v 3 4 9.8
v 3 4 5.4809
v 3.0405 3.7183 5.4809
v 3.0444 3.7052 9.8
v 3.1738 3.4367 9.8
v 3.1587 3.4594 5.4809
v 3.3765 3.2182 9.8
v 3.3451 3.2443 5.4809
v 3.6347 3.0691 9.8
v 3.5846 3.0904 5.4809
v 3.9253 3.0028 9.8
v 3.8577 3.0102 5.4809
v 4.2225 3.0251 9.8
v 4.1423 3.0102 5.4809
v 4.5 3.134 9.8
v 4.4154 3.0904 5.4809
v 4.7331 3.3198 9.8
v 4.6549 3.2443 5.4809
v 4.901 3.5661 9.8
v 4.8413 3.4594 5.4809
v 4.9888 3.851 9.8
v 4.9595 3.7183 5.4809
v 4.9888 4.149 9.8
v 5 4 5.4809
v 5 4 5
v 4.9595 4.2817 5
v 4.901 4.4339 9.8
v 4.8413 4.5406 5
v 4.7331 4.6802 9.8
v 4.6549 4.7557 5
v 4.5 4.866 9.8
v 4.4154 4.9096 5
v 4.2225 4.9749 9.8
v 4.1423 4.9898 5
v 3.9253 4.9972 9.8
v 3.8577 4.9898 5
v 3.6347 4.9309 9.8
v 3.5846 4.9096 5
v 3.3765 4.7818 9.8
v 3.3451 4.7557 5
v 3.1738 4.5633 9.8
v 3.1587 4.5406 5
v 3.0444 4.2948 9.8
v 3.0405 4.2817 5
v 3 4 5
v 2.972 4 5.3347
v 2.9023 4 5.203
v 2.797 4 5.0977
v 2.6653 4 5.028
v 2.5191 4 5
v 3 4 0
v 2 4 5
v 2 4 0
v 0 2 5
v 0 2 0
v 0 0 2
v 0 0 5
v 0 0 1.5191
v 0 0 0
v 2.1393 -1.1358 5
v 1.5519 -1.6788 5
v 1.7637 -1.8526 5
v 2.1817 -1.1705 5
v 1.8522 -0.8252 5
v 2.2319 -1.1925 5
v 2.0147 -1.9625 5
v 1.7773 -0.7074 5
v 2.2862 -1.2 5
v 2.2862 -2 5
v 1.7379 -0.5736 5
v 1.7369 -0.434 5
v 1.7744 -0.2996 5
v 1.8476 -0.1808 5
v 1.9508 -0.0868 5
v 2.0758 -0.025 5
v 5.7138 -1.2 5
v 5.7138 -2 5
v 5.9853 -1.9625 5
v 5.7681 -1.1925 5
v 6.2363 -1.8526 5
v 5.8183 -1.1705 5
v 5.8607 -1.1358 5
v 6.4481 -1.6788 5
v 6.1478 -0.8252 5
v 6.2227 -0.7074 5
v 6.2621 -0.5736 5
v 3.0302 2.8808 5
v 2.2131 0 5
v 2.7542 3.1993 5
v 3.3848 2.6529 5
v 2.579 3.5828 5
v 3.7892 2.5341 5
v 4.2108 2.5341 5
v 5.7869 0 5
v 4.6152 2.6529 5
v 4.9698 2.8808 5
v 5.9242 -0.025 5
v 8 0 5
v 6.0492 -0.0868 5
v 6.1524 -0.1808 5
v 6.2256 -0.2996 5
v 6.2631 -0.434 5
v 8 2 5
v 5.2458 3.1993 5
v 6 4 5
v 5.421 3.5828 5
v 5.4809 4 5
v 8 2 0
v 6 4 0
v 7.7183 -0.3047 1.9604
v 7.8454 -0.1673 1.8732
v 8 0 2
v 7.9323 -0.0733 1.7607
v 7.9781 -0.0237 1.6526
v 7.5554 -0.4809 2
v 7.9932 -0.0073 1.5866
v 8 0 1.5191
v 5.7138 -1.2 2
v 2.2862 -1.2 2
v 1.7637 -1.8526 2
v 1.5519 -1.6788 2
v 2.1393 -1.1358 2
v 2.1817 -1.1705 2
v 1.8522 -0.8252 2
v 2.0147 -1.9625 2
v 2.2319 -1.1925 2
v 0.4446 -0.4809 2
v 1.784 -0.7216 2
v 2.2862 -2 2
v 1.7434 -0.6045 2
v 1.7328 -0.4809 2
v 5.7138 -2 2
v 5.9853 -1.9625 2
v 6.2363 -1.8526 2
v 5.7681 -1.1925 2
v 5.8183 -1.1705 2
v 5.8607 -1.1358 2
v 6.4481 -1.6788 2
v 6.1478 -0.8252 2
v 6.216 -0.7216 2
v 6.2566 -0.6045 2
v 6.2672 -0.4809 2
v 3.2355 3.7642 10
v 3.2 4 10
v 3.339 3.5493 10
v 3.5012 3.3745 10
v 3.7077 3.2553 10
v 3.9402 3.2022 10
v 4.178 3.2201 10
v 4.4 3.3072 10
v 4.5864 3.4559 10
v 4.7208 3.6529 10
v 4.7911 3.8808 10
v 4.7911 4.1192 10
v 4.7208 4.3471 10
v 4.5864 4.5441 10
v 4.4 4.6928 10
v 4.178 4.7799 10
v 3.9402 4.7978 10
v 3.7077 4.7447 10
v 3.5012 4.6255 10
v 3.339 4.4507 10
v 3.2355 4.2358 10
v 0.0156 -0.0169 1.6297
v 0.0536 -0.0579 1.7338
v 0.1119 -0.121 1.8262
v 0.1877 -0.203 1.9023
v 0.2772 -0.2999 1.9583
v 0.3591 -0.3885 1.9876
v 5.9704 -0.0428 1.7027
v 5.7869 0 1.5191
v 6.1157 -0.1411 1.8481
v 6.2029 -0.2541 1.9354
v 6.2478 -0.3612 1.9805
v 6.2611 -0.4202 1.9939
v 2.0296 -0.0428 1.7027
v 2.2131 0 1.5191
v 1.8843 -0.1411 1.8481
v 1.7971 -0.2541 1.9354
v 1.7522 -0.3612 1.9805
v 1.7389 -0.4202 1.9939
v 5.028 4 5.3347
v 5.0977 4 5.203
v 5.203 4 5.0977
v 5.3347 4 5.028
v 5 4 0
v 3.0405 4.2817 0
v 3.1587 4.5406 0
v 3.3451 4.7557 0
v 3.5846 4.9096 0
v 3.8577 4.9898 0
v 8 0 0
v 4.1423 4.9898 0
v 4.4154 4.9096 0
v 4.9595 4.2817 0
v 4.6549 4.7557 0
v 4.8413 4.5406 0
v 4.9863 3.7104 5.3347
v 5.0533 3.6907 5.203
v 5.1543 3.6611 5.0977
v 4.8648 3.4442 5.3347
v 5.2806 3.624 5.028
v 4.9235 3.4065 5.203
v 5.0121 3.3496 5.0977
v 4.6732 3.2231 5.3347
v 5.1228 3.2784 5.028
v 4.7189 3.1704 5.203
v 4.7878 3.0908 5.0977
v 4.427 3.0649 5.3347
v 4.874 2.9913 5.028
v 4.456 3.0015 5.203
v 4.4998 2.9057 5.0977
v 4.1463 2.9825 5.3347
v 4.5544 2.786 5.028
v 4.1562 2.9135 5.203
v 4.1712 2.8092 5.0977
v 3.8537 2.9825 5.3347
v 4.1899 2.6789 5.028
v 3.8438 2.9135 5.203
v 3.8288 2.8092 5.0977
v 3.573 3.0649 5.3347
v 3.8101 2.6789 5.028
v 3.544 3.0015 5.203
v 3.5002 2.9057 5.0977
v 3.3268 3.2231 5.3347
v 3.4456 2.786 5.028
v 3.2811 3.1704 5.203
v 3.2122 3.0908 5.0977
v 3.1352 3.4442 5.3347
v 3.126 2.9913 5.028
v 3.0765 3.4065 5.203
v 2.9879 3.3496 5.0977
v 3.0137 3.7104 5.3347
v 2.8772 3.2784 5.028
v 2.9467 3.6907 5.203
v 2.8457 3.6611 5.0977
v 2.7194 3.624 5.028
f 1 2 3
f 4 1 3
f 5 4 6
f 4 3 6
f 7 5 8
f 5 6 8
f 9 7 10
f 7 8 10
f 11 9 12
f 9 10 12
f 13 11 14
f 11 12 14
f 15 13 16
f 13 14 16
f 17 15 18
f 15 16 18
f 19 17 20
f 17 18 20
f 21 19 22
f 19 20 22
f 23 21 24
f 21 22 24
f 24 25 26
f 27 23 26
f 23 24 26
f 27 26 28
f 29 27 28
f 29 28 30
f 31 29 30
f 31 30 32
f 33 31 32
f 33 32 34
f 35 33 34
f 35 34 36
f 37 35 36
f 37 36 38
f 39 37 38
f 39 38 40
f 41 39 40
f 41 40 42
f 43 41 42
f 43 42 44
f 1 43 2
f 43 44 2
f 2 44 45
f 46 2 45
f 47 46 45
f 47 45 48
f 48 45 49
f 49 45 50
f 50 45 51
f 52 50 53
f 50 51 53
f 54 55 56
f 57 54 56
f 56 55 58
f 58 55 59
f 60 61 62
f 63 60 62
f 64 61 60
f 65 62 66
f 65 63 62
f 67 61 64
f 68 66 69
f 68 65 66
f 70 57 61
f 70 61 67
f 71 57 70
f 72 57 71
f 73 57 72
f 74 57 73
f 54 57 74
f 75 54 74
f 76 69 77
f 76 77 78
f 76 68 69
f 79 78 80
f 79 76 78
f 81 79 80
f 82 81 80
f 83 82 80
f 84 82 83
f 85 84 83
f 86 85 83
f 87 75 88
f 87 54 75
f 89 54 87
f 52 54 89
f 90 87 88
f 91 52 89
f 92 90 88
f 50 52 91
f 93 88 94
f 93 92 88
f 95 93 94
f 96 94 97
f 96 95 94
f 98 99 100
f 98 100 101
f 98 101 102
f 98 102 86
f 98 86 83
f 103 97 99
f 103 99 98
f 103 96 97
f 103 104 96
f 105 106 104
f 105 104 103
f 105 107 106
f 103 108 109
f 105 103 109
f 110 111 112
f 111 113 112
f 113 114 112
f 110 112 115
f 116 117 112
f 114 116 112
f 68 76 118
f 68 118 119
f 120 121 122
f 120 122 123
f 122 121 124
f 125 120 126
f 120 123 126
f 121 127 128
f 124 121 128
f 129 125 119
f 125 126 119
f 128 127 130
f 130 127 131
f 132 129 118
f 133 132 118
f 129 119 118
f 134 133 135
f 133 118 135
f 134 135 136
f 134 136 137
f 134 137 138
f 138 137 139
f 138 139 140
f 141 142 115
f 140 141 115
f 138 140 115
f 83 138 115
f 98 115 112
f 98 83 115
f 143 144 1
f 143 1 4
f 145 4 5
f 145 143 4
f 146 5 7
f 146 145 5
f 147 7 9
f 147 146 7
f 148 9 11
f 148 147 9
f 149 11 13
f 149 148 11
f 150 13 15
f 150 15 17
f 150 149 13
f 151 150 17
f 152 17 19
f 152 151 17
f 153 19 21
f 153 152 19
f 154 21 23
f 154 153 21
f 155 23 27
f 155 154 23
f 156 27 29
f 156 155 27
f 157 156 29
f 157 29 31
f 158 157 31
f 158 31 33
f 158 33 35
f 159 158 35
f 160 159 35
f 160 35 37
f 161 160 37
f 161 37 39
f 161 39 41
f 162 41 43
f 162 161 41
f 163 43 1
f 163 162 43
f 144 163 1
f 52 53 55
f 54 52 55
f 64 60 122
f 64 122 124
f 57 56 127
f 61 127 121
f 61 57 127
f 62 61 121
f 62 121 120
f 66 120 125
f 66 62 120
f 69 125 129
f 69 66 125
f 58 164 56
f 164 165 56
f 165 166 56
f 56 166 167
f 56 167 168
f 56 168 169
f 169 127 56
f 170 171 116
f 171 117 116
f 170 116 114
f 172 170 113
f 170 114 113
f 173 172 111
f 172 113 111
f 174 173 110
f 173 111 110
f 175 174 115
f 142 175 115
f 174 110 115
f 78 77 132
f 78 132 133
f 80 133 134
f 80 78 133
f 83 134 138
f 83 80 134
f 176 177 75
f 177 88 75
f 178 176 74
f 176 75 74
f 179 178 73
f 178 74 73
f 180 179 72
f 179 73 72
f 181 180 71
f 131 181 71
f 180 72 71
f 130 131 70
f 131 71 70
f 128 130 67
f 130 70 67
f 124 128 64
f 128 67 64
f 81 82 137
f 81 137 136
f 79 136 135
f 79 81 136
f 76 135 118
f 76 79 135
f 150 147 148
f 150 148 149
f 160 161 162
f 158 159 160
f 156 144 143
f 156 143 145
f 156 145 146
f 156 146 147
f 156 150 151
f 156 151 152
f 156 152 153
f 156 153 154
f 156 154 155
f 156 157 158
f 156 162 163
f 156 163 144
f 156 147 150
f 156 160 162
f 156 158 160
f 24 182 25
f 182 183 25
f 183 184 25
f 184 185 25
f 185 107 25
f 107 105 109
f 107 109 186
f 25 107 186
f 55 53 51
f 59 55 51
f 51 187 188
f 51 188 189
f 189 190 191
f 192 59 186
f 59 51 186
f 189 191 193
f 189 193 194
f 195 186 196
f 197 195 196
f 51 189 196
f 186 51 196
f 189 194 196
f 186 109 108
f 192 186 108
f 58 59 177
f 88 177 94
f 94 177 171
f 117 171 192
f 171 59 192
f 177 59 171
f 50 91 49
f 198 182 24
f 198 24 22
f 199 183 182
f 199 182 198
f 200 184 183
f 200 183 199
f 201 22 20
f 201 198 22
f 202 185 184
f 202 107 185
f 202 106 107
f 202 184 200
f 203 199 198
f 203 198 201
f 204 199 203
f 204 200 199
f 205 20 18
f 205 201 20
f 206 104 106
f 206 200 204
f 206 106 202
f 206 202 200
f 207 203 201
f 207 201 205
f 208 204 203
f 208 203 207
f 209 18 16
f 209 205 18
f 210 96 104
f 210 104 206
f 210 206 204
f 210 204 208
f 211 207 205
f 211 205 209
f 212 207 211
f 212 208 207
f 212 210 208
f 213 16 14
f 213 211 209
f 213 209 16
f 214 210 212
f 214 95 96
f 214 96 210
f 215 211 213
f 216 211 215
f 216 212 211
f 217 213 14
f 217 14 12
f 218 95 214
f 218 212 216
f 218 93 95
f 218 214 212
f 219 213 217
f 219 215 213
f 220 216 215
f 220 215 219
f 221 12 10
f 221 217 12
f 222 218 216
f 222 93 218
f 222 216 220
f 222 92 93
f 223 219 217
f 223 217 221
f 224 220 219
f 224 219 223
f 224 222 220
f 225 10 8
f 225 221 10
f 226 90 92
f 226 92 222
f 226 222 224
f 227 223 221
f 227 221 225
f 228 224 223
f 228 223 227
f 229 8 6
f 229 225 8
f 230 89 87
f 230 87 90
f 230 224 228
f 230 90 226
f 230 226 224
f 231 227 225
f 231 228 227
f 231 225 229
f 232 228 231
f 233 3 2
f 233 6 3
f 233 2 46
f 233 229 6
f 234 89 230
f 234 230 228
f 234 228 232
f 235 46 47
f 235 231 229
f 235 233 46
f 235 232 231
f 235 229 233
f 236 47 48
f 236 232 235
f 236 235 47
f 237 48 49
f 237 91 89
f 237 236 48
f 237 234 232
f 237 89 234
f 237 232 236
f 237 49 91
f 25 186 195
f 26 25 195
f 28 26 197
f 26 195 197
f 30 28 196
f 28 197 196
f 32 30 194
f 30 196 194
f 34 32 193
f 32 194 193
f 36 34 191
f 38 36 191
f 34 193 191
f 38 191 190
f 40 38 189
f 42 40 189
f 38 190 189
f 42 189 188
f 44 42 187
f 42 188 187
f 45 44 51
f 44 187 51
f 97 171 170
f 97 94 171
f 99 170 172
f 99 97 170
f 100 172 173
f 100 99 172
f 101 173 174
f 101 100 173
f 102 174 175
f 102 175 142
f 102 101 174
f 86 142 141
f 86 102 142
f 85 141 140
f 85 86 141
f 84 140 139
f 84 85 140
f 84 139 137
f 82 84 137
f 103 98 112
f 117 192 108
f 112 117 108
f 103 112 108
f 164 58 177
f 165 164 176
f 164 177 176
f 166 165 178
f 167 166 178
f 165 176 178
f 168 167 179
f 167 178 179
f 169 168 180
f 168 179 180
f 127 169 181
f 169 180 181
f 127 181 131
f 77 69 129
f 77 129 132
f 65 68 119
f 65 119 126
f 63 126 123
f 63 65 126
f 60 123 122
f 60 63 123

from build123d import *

# Parameters (mm, degrees)
F1_DEPTH     = 5
F2_DEPTH     = 10
F3_SIZE      = 0.2
F5_DEPTH     = 3
F6_T1_DEPTH  = 3
F6_T6_DEPTH  = 2.3418509092
F6_T12_DEPTH = 2.3418509092
F6_T16_ANGLE = 180
F6_T21_DEPTH = 2.3418509092
F6_T25_DEPTH = 5.8592538582
F6_T33_DEPTH = 5.8592538582
F6_T38_DEPTH = 2.3418509092


# Not quite as in the source:
# - a fillet or chamfer that OpenCascade refuses, or shapes differently, is made with other operations: its cross-section is extruded or revolved along the edge and cut away or added


with BuildPart() as f1:
    # F0 (on Top) → F1 (new body)
    with BuildSketch(Plane.XY):
        with BuildLine():
            Line((0, 2), (0, 0))
            Line((0, 0), (8, 0))
            Line((8, 0), (8, 2))
            Line((8, 2), (6, 4))
            Line((6, 4), (5, 4))
            ThreePointArc((5, 4), (4, 3), (3, 4))
            Line((3, 4), (2, 4))
            Line((2, 4), (0, 2))
        make_face()
        with BuildLine():
            ThreePointArc((5, 4), (4, 5), (3, 4))
            Line((3, 4), (5, 4))
        make_face()
        with BuildLine():
            Line((5, 4), (3, 4))
            ThreePointArc((3, 4), (4, 3), (5, 4))
        make_face()
    extrude(amount=F1_DEPTH)

    # F0 (on Top) → F2 (join)
    with BuildSketch(Plane.XY):
        with BuildLine():
            ThreePointArc((5, 4), (4, 5), (3, 4))
            Line((3, 4), (5, 4))
        make_face()
        with BuildLine():
            Line((5, 4), (3, 4))
            ThreePointArc((3, 4), (4, 3), (5, 4))
        make_face()
    extrude(amount=F2_DEPTH)

    # F3
    f3_edges = [f1.edges().sort_by_distance(p)[0] for p in [
        (5, 4, 10),
    ]]
    chamfer(f3_edges, length=F3_SIZE)

    # F4 (on face) → F5 (join)
    with BuildSketch(Plane.XY.offset(5)):
        with BuildLine():
            Line((1.0894362964, 0), (0, 0))
            Line((0, 0), (1.5518551177, -1.6787983581))
            ThreePointArc((1.5518551177, -1.6787983581), (1.8854295116, -1.9161873057), (2.286179834, -2))
            Line((2.286179834, -2), (5.713820166, -2))
            ThreePointArc((5.713820166, -2), (6.1145704884, -1.9161873057), (6.4481448823, -1.6787983581))
            Line((6.4481448823, -1.6787983581), (8, 0))
            Line((8, 0), (6.9105637036, 0))
            Line((6.9105637036, 0), (5.8606851097, -1.1357596721))
            ThreePointArc((5.8606851097, -1.1357596721), (5.7939702307, -1.1832374617), (5.713820166, -1.2000000007))
            Line((5.713820166, -1.2000000007), (2.286179834, -1.2000000007))
            ThreePointArc((2.286179834, -1.2000000007), (2.2060297693, -1.1832374617), (2.1393148903, -1.1357596721))
            Line((2.1393148903, -1.1357596721), (1.0894362964, 0))
        make_face()
    extrude(amount=-F5_DEPTH)

    # F6: fillet of radius 0.5 on 5 edges, made by hand

    # F6_s2 → F6_t1 (join)
    with BuildSketch(Plane.XY.offset(2)):
        with BuildLine():
            ThreePointArc((5.7668622302, 0.0004), (6.2255674394, -0.2996248388), (6.1345147512, -0.8401197793))
            Line((6.1345147512, -0.8401197793), (6.1712800033, -0.8741050071))
            ThreePointArc((6.1712800033, -0.8741050071), (6.5591576145, -0.4539093578), (6.9473289557, -0.0339852278))
            Line((6.9473289557, -0.0339852278), (6.9105637036, 0.0500667501))
            ThreePointArc((6.9105637036, 0.0500667501), (6.3387129669, 0.0500667501), (5.7668622302, 0.0504667501))
            Line((5.7668622302, 0.0504667501), (5.7668622302, 0.0004))
        make_face()
        with BuildLine():
            ThreePointArc((2.2331377698, 0.0004), (1.7744325606, -0.2996248388), (1.8654852488, -0.8401197793))
            Line((1.8654852488, -0.8401197793), (1.8287199967, -0.8741050071))
            ThreePointArc((1.8287199967, -0.8741050071), (1.4408423855, -0.4539093578), (1.0526710443, -0.0339852278))
            Line((1.0526710443, -0.0339852278), (1.0894362964, 0.0500667501))
            ThreePointArc((1.0894362964, 0.0500667501), (1.6612870331, 0.0500667501), (2.2331377698, 0.0504667501))
            Line((2.2331377698, 0.0504667501), (2.2331377698, 0.0004))
        make_face()
    extrude(amount=F6_T1_DEPTH)


with BuildPart() as f6_tool4:
    # F6_s5 → F6_t6 (new body)
    with BuildSketch(Plane.YZ.offset(8)):
        with BuildLine():
            ThreePointArc((0.0004, 1.4990343146), (-0.1464466094, 1.8535533906), (-0.5009656854, 2.0004))
            Line((-0.5009656854, 2.0004), (-0.5009656854, 2.0505365685))
            ThreePointArc((-0.5009656854, 2.0505365685), (-0.2504828427, 2.0501365685), (0, 2.0501365685))
            Line((0, 2.0501365685), (0.0501365685, 2))
            ThreePointArc((0.0501365685, 2), (0.0501365685, 1.7495171573), (0.0505365685, 1.4990343146))
            Line((0.0505365685, 1.4990343146), (0.0004, 1.4990343146))
        make_face()
    extrude(amount=-F6_T6_DEPTH)

    split(bisect_by=Plane(origin=(4.3138623121, -3.9876672942, 0), x_dir=(0, 0, 1), z_dir=(-0.7343247163, 0.6787983581, 0)), keep=Keep.TOP)

    split(bisect_by=Plane(origin=(3.7264025395, -3.4446286081, 0), x_dir=(0, 0, 1), z_dir=(0.7343247163, -0.6787983581, 0)), keep=Keep.TOP)


with BuildPart() as f1_1:
    add(f1.part)

    # F6_t3: union F6_tool4
    add(f6_tool4.part)


with BuildPart() as f6_tool10:
    # F6_s11 → F6_t12 (new body)
    with BuildSketch(Plane.YZ.offset(2.3418509092)):
        with BuildLine():
            ThreePointArc((0.0004, 1.4990343146), (-0.1464466094, 1.8535533906), (-0.5009656854, 2.0004))
            Line((-0.5009656854, 2.0004), (-0.5009656854, 2.0505365685))
            ThreePointArc((-0.5009656854, 2.0505365685), (-0.2504828427, 2.0501365685), (0, 2.0501365685))
            Line((0, 2.0501365685), (0.0501365685, 2))
            ThreePointArc((0.0501365685, 2), (0.0501365685, 1.7495171573), (0.0505365685, 1.4990343146))
            Line((0.0505365685, 1.4990343146), (0.0004, 1.4990343146))
        make_face()
    extrude(amount=-F6_T12_DEPTH)

    split(bisect_by=Plane(origin=(0, 0, 0), x_dir=(0, 0, 1), z_dir=(0.7343247163, 0.6787983581, 0)), keep=Keep.TOP)

    split(bisect_by=Plane(origin=(0.5874597726, 0.543038686, 0), x_dir=(0, 0, 1), z_dir=(-0.7343247163, -0.6787983581, 0)), keep=Keep.TOP)


with BuildPart() as f1_2:
    add(f1_1.part)

    # F6_t9: union F6_tool10
    add(f6_tool10.part)

    # F6_s15 → F6_t16 (revolve)
    with BuildSketch(Plane.XZ.offset(-4)):
        with BuildLine():
            ThreePointArc((4.9996, 5.5009656854), (5.1464466094, 5.1464466094), (5.5009656854, 4.9996))
            Line((5.5009656854, 4.9996), (5.5009656854, 4.9494634315))
            ThreePointArc((5.5009656854, 4.9494634315), (5.2504828427, 4.9498634315), (5, 4.9498634315))
            Line((5, 4.9498634315), (4.9498634315, 5))
            ThreePointArc((4.9498634315, 5), (4.9498634315, 5.2504828427), (4.9494634315, 5.5009656854))
            Line((4.9494634315, 5.5009656854), (4.9996, 5.5009656854))
        make_face()
    revolve(axis=Axis((4, 4, 5), (0, 0, -1)), revolution_arc=F6_T16_ANGLE)


with BuildPart() as f6_tool19:
    # F6_s20 → F6_t21 (new body)
    with BuildSketch(Plane.YZ.offset(8)):
        with BuildLine():
            ThreePointArc((0.0004, 1.4990343146), (-0.1464466094, 1.8535533906), (-0.5009656854, 2.0004))
            Line((-0.5009656854, 2.0004), (-0.5009656854, 2.0505365685))
            ThreePointArc((-0.5009656854, 2.0505365685), (-0.2504828427, 2.0501365685), (0, 2.0501365685))
            Line((0, 2.0501365685), (0.0501365685, 2))
            ThreePointArc((0.0501365685, 2), (0.0501365685, 1.7495171573), (0.0505365685, 1.4990343146))
            Line((0.0505365685, 1.4990343146), (0.0004, 1.4990343146))
        make_face()
    extrude(amount=-F6_T21_DEPTH)

    split(bisect_by=Plane(origin=(3.7264025395, -3.4446286081, 0), x_dir=(0, 0, 1), z_dir=(-0.7343247163, 0.6787983581, 0)), keep=Keep.TOP)


with BuildPart() as f6_tool23:
    # F6_s24 → F6_t25 (new body)
    with BuildSketch(Plane.XY.offset(5)):
        with BuildLine():
            ThreePointArc((5.7668622302, 0.0004), (6.2255674394, -0.2996248388), (6.1345147512, -0.8401197793))
            Line((6.1345147512, -0.8401197793), (6.1712800033, -0.8741050071))
            ThreePointArc((6.1712800033, -0.8741050071), (6.5591576145, -0.4539093578), (6.9473289557, -0.0339852278))
            Line((6.9473289557, -0.0339852278), (6.9105637036, 0.0500667501))
            ThreePointArc((6.9105637036, 0.0500667501), (6.3387129669, 0.0500667501), (5.7668622302, 0.0504667501))
            Line((5.7668622302, 0.0504667501), (5.7668622302, 0.0004))
        make_face()
    extrude(amount=-F6_T25_DEPTH)

    split(bisect_by=Plane.XY, keep=Keep.TOP)

    split(bisect_by=Plane.XY.offset(2), keep=Keep.BOTTOM)


with BuildPart() as f6_tool19_1:
    add(f6_tool19.part)

    # F6_t28: intersect F6_tool23
    add(f6_tool23.part, mode=Mode.INTERSECT)


with BuildPart() as f1_3:
    add(f1_2.part)

    # F6_t17: union F6_tool19
    add(f6_tool19_1.part)


with BuildPart() as f6_tool31:
    # F6_s32 → F6_t33 (new body)
    with BuildSketch(Plane.XY.offset(5)):
        with BuildLine():
            ThreePointArc((2.2331377698, 0.0004), (1.7744325606, -0.2996248388), (1.8654852488, -0.8401197793))
            Line((1.8654852488, -0.8401197793), (1.8287199967, -0.8741050071))
            ThreePointArc((1.8287199967, -0.8741050071), (1.4408423855, -0.4539093578), (1.0526710443, -0.0339852278))
            Line((1.0526710443, -0.0339852278), (1.0894362964, 0.0500667501))
            ThreePointArc((1.0894362964, 0.0500667501), (1.6612870331, 0.0500667501), (2.2331377698, 0.0504667501))
            Line((2.2331377698, 0.0504667501), (2.2331377698, 0.0004))
        make_face()
    extrude(amount=-F6_T33_DEPTH)

    split(bisect_by=Plane.XY, keep=Keep.TOP)

    split(bisect_by=Plane.XY.offset(2), keep=Keep.BOTTOM)


with BuildPart() as f6_tool36:
    # F6_s37 → F6_t38 (new body)
    with BuildSketch(Plane.YZ.offset(2.3418509092)):
        with BuildLine():
            ThreePointArc((0.0004, 1.4990343146), (-0.1464466094, 1.8535533906), (-0.5009656854, 2.0004))
            Line((-0.5009656854, 2.0004), (-0.5009656854, 2.0505365685))
            ThreePointArc((-0.5009656854, 2.0505365685), (-0.2504828427, 2.0501365685), (0, 2.0501365685))
            Line((0, 2.0501365685), (0.0501365685, 2))
            ThreePointArc((0.0501365685, 2), (0.0501365685, 1.7495171573), (0.0505365685, 1.4990343146))
            Line((0.0505365685, 1.4990343146), (0.0004, 1.4990343146))
        make_face()
    extrude(amount=-F6_T38_DEPTH)

    split(bisect_by=Plane(origin=(0.5874597726, 0.543038686, 0), x_dir=(0, 0, 1), z_dir=(0.7343247163, 0.6787983581, 0)), keep=Keep.TOP)


with BuildPart() as f6_tool31_1:
    add(f6_tool31.part)

    # F6_t40: intersect F6_tool36
    add(f6_tool36.part, mode=Mode.INTERSECT)


with BuildPart() as f1_4:
    add(f1_3.part)

    # F6_t29: union F6_tool31
    add(f6_tool31_1.part)


solid = f1_4.part
